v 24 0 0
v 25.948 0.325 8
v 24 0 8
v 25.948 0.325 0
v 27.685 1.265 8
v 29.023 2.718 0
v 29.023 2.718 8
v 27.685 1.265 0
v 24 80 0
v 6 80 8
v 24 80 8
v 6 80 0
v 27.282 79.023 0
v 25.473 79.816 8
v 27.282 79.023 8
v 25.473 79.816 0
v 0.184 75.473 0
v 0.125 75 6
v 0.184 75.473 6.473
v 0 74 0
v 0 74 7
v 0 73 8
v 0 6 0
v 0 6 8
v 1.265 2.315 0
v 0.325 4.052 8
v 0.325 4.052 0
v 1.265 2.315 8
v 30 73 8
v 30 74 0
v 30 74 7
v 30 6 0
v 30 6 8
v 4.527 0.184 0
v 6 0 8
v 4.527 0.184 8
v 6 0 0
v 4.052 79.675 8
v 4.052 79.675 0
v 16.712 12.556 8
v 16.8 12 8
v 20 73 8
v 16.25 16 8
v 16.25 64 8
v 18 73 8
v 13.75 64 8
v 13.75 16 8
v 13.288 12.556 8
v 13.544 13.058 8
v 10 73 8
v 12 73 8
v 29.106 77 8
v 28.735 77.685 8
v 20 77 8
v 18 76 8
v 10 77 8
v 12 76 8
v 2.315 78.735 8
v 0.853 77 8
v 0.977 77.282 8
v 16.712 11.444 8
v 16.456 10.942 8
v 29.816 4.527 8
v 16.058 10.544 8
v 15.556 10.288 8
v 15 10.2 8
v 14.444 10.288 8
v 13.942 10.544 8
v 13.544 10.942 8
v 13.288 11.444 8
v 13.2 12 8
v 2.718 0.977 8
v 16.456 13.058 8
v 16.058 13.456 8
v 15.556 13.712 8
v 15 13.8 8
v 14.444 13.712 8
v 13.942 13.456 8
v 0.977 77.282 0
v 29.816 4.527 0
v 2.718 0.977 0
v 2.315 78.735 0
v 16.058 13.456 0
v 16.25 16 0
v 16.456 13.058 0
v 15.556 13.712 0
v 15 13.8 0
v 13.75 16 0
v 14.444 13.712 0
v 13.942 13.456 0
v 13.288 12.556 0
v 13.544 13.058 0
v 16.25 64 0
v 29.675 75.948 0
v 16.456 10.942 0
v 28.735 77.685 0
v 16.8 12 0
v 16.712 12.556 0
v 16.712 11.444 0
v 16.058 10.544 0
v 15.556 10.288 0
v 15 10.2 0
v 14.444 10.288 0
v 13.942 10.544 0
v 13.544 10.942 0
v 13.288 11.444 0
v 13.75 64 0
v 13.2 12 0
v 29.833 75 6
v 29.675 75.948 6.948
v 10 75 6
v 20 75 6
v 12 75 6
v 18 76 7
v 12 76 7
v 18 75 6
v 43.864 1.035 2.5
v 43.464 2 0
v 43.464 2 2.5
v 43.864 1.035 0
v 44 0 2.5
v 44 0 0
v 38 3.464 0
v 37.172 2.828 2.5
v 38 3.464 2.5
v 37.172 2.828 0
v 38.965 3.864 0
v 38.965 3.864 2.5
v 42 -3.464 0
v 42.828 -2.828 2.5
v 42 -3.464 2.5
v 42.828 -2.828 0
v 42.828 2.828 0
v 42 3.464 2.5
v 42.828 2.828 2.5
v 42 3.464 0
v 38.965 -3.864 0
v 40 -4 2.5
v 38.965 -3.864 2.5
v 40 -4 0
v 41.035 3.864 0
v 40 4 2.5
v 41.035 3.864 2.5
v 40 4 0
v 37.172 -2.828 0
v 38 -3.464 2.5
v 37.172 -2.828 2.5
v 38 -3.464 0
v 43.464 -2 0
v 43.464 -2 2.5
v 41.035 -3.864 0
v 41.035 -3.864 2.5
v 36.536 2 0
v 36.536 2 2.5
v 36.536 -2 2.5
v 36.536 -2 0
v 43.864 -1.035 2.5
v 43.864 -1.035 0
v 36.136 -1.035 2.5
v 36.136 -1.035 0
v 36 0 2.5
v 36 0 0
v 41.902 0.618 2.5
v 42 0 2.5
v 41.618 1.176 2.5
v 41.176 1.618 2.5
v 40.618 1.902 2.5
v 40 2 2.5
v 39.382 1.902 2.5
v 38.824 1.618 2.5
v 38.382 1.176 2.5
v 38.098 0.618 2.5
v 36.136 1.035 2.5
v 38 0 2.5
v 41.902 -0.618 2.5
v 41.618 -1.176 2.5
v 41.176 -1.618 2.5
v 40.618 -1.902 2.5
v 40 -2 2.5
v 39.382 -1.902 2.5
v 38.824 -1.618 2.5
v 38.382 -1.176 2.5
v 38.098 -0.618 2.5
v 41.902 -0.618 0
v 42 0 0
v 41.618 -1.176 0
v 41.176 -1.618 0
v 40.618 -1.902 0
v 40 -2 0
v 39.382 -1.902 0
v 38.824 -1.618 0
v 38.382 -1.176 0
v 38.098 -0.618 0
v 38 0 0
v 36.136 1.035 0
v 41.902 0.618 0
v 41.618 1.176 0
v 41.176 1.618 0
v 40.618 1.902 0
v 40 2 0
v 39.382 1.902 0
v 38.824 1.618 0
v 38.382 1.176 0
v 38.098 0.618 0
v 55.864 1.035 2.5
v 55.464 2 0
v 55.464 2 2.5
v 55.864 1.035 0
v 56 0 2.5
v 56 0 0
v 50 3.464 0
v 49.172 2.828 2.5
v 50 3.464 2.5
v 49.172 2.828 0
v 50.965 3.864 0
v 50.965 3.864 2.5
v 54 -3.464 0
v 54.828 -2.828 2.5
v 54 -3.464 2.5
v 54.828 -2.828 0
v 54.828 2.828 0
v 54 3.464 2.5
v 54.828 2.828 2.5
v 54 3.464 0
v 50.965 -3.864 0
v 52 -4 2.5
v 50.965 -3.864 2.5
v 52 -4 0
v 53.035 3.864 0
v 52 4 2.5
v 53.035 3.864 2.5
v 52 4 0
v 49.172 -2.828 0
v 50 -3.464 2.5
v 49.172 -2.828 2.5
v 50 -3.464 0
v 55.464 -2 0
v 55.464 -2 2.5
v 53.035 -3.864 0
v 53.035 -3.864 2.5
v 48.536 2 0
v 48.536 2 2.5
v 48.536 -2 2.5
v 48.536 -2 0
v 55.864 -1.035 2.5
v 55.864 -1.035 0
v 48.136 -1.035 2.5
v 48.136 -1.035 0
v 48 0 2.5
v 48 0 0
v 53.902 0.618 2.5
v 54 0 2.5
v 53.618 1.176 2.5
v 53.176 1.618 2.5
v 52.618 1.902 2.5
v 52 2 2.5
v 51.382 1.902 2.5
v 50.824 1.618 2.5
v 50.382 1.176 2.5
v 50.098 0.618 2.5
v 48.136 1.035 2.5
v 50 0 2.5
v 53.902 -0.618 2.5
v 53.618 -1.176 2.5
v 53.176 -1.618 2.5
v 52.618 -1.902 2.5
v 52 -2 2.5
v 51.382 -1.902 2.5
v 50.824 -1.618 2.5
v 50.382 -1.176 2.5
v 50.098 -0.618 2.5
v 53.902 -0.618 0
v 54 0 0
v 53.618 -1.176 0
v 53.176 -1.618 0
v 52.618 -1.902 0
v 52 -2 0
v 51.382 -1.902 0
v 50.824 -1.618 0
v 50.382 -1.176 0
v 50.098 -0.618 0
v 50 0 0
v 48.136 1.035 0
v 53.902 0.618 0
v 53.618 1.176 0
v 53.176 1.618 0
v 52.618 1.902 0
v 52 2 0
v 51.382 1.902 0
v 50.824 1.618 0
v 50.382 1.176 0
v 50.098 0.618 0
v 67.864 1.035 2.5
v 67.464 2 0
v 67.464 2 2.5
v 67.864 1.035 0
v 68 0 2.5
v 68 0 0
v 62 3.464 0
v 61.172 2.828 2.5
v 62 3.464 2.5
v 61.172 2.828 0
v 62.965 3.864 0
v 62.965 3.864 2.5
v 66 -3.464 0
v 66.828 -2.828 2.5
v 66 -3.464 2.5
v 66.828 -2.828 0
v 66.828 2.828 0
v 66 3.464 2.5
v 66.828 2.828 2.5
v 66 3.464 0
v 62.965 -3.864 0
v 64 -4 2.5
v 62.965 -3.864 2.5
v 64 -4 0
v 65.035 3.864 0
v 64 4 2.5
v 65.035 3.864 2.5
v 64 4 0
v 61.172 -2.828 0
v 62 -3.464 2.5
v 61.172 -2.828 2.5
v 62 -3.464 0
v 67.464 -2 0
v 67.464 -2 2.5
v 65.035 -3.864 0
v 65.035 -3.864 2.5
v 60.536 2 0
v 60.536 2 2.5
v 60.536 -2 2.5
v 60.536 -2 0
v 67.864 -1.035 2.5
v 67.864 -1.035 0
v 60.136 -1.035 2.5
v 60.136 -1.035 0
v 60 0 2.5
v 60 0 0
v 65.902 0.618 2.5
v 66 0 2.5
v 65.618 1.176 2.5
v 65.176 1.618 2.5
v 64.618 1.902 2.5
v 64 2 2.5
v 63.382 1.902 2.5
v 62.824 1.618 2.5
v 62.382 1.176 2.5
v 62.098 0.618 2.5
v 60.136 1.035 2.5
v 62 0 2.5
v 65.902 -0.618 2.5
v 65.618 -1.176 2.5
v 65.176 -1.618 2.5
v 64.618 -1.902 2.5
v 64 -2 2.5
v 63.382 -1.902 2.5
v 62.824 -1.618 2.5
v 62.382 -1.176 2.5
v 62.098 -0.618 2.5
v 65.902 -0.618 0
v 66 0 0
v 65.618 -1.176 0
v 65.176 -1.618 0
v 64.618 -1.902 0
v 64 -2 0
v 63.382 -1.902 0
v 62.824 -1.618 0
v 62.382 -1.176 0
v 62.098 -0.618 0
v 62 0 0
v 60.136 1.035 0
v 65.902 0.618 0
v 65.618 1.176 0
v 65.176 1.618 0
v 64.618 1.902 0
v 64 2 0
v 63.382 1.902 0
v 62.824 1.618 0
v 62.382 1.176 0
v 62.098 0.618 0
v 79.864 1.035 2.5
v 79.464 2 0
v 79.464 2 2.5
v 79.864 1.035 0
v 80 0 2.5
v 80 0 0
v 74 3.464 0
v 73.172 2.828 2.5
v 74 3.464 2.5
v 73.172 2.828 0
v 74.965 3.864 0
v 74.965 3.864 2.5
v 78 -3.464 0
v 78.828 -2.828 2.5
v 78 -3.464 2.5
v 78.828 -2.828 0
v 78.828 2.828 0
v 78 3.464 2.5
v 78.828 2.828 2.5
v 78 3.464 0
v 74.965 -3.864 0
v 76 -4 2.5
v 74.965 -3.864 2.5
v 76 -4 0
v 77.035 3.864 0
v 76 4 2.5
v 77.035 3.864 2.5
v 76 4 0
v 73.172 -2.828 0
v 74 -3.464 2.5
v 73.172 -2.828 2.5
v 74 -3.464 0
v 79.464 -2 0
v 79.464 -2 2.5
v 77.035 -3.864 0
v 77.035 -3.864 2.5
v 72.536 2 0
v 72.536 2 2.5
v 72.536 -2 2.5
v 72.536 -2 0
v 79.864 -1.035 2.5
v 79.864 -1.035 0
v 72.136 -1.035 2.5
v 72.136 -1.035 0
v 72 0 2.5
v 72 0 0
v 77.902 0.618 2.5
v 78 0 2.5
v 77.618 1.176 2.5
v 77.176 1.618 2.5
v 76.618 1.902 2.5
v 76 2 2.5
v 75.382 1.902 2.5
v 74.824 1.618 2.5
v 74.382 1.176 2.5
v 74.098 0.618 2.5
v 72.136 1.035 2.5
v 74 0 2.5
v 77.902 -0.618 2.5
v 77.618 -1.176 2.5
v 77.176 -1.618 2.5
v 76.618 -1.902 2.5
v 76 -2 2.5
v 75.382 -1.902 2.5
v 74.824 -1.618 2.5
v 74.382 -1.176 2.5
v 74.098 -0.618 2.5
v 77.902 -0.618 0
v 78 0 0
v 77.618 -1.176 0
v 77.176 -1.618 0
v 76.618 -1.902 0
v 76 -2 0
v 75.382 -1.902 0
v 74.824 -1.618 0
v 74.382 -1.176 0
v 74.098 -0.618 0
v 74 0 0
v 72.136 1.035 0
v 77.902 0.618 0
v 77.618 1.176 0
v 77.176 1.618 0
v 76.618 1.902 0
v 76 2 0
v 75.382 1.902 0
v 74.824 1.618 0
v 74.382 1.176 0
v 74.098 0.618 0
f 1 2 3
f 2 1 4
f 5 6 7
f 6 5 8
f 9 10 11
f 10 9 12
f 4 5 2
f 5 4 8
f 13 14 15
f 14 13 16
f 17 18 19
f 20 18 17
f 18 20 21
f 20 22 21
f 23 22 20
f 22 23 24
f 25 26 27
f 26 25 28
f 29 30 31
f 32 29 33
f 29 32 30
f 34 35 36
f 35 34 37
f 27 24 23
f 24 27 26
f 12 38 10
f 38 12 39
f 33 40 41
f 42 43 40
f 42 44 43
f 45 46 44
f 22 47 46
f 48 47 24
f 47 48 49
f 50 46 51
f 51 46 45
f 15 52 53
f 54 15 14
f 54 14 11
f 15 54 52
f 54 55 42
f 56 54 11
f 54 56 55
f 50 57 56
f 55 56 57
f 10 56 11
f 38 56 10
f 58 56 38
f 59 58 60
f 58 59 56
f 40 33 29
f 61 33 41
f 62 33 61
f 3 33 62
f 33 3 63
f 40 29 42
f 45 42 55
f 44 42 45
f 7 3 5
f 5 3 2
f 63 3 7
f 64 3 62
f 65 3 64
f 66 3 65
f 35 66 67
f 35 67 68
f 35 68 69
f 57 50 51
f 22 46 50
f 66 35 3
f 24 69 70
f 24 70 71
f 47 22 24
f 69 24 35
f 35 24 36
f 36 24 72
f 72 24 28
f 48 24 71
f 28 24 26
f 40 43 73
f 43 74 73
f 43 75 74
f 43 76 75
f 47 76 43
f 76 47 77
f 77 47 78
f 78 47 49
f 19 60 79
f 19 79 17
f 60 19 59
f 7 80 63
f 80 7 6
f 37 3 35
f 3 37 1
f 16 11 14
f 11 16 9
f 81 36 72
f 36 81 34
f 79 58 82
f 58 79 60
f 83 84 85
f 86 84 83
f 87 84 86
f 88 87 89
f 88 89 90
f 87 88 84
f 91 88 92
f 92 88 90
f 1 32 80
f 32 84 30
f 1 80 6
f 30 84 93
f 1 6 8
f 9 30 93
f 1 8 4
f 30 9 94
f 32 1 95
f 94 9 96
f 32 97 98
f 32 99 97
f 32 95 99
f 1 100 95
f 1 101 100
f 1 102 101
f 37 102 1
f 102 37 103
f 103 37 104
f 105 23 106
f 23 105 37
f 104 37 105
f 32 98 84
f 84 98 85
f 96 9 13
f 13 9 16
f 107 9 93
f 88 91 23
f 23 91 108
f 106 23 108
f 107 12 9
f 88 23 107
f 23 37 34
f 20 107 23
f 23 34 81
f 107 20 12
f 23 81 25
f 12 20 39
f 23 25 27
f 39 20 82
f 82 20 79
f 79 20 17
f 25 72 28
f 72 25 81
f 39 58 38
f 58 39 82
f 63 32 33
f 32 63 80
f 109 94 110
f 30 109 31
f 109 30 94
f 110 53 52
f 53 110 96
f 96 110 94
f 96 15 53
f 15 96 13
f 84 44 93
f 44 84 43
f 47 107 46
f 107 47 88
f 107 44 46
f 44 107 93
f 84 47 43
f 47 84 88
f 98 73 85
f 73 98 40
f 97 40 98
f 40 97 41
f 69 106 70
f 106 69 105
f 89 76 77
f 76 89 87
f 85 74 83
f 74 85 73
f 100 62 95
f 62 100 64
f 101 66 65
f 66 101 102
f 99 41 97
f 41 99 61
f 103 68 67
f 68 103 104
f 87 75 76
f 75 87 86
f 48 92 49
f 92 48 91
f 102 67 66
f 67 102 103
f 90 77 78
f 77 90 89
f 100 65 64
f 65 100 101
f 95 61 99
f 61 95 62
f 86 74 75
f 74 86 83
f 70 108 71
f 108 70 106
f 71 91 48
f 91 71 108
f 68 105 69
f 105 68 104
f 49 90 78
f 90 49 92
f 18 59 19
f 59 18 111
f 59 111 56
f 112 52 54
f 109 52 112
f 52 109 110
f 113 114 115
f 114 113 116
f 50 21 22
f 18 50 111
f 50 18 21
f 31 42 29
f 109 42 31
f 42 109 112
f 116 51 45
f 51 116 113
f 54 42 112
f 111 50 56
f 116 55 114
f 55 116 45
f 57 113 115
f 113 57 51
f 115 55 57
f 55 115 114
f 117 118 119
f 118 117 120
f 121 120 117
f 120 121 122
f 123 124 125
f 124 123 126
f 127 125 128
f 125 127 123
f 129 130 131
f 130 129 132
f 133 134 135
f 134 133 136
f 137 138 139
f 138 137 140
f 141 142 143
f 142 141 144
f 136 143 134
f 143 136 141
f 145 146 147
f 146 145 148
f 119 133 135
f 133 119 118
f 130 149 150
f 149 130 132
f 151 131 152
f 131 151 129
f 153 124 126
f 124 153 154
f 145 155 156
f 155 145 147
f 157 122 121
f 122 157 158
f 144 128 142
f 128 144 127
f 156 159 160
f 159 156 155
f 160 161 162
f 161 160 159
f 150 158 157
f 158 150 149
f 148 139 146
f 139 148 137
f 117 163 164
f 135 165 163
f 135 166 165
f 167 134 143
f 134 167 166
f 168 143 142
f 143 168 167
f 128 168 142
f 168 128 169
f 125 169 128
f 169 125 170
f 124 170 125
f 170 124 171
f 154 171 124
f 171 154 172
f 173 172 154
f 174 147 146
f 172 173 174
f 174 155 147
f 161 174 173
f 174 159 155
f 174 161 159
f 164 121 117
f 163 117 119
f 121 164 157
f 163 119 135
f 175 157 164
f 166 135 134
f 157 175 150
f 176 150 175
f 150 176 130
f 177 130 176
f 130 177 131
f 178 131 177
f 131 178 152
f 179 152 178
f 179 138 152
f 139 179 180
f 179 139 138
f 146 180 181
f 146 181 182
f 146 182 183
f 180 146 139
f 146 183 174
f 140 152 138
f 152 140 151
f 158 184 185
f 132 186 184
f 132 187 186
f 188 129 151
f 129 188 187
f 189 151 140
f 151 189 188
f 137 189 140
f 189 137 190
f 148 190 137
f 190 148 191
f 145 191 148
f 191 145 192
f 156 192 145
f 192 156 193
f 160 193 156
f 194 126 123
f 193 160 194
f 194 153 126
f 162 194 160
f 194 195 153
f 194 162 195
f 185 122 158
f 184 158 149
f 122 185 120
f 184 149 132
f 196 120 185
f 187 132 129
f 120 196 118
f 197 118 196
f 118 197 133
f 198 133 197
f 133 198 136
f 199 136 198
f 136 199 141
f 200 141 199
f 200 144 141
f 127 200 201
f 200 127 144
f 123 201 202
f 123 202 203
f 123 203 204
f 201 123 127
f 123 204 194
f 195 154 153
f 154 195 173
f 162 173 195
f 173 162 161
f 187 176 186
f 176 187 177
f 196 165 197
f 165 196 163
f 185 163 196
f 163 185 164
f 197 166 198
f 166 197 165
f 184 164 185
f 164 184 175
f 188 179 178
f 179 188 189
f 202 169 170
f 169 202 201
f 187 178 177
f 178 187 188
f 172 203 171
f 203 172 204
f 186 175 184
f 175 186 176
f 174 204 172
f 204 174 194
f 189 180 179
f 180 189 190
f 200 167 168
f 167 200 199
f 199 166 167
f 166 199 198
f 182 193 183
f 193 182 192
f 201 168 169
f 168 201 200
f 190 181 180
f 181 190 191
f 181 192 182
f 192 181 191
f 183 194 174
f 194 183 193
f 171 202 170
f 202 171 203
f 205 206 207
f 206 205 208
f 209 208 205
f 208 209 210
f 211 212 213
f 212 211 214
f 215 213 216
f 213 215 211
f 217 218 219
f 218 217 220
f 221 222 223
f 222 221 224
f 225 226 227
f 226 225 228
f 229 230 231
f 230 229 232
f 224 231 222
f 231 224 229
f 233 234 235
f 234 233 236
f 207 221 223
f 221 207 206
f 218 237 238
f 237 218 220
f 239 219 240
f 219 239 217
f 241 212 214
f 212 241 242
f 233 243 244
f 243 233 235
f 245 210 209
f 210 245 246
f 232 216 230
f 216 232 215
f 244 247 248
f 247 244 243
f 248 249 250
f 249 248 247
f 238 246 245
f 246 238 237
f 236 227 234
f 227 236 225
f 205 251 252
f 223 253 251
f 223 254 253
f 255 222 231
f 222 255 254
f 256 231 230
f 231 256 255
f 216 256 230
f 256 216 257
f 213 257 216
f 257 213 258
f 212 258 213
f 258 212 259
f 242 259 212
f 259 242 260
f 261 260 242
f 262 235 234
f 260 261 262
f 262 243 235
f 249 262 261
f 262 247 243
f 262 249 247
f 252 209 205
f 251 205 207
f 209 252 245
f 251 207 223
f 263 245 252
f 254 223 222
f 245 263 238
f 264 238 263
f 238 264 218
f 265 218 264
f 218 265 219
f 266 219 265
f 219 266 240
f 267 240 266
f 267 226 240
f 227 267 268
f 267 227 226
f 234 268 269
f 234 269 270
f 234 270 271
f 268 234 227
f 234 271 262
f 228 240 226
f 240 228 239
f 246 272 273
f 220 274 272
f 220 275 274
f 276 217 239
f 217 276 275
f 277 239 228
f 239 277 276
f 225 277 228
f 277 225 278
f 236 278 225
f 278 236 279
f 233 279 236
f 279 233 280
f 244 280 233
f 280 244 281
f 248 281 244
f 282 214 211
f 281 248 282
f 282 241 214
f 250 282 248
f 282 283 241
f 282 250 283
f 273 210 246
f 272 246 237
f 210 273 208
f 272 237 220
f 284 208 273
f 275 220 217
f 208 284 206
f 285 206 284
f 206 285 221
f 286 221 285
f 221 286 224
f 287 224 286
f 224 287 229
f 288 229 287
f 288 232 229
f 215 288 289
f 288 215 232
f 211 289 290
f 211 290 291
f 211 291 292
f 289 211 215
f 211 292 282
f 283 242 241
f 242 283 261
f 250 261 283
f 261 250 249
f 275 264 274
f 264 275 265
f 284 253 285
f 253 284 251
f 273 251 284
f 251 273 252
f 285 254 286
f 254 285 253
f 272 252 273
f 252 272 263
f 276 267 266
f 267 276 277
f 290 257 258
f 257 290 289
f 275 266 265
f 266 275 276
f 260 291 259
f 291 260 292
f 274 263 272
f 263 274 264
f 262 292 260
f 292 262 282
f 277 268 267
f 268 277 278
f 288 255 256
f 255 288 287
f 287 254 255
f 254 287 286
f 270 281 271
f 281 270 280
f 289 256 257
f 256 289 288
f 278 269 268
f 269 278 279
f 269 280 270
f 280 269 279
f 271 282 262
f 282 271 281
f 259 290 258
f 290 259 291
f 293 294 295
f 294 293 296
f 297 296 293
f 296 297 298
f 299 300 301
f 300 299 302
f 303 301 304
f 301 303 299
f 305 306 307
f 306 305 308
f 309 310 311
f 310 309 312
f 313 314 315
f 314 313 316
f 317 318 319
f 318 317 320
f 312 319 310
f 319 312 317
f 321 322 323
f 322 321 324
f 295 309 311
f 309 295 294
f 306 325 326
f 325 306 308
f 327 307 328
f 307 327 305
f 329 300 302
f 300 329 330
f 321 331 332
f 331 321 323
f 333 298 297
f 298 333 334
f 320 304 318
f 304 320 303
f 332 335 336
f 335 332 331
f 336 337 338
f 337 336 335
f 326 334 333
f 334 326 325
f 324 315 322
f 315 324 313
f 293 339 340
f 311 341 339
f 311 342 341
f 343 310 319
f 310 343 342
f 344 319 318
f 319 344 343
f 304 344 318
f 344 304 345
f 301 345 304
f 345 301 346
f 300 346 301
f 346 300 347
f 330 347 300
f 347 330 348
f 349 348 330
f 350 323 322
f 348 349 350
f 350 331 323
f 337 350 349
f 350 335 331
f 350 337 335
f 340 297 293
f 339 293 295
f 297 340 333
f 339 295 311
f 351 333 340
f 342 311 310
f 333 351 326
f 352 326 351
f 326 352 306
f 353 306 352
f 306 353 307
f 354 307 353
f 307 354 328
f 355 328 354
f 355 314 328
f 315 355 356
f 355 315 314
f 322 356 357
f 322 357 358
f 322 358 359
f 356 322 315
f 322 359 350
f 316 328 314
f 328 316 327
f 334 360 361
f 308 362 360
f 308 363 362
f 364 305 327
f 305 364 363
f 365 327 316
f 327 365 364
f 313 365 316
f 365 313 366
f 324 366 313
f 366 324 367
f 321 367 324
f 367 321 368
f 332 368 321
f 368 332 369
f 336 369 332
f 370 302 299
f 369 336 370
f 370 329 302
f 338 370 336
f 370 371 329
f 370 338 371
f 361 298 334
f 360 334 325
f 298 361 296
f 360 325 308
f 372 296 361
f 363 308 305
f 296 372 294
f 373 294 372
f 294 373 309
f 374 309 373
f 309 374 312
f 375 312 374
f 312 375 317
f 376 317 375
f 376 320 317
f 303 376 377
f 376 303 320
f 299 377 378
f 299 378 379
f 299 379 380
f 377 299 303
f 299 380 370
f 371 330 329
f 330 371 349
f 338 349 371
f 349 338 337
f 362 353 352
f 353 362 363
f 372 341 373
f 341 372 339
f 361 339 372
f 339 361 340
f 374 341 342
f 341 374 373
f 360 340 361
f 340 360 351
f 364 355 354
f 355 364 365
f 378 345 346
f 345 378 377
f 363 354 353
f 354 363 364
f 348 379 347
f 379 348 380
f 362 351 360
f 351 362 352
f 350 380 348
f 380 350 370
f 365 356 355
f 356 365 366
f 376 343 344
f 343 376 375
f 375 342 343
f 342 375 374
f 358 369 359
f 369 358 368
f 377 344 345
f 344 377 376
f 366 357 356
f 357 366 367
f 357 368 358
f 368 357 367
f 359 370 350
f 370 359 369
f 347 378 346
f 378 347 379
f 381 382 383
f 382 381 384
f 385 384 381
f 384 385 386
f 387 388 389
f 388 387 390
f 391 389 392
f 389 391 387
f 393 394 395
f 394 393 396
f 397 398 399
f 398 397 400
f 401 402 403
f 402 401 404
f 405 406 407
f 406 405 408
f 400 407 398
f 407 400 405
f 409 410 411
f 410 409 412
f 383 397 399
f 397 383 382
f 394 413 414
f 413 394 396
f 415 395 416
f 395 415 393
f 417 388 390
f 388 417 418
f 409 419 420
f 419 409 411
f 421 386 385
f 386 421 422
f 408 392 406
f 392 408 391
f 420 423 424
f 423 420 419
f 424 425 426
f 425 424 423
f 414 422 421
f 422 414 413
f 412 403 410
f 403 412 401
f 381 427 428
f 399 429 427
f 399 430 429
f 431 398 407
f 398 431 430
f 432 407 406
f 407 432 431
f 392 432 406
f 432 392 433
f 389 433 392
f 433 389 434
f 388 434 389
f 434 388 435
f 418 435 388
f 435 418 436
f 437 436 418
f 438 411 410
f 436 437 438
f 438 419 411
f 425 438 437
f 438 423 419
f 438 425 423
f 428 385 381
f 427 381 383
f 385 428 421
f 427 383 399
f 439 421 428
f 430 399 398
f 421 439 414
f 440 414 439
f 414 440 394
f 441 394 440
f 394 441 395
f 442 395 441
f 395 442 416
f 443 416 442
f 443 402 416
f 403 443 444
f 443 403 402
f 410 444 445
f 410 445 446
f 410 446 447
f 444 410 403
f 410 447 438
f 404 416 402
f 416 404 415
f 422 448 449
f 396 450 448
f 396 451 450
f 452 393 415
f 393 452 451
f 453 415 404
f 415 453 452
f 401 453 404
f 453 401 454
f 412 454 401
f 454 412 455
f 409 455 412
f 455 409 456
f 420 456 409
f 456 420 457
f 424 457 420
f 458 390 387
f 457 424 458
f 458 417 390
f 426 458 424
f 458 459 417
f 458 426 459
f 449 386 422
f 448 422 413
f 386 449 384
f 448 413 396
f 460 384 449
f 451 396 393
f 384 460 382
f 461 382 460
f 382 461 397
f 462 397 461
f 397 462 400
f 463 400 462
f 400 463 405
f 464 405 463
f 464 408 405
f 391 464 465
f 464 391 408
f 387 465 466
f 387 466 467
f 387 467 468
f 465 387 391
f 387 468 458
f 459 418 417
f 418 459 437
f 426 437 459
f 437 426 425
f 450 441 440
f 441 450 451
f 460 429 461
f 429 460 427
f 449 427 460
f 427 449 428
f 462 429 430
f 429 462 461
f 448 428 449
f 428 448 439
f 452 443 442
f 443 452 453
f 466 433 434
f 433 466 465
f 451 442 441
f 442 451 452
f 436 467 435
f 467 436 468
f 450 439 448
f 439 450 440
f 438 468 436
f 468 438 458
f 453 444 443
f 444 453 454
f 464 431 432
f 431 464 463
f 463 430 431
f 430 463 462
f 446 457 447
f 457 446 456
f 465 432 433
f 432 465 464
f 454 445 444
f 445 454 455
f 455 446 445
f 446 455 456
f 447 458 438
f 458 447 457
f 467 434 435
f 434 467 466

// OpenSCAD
// Key Organizer - Quiet Carry Style
// PETG (durable, flexible tabs) — 0.2mm, 4 walls, 30% infill
// Holds 2-8 keys, M3 bolt pivot (hardware: 1x M3x20 + nut)

KEYS       = 5;    // Number of keys
BODY_W     = 30;
BODY_H     = 80;
BODY_T     = 8.0;
KEY_SLOT_W = 2.5;  // Key blade thickness + play
KEY_SLOT_H = 48;
PIVOT_D    = 3.6;  // M3 bolt + play
PIVOT_Z    = 12;
CORNER_R   = 6;
WALL_T     = 2.5;
SPRING_T   = 1.2;  // Friction spring tab thickness — PLA works, PETG better

module body_2d() {
    offset(r = CORNER_R)
        offset(r = -CORNER_R)
            square([BODY_W, BODY_H]);
}

module key_slot() {
    translate([BODY_W/2 - KEY_SLOT_W/2, PIVOT_Z + 4, -1])
        cube([KEY_SLOT_W, KEY_SLOT_H, BODY_T + 2]);
}

module pivot_hole() {
    translate([BODY_W/2, PIVOT_Z, -1])
        cylinder(d = PIVOT_D, h = BODY_T + 2, $fn = 20);
}

module friction_spring() {
    // Thin tab that presses against key stack for friction
    translate([BODY_W/2 - SPRING_T/2, PIVOT_Z + 1, BODY_T/2 - SPRING_T/2])
        rotate([0, 90, 0])
            cylinder(d = SPRING_T, h = BODY_W/2, $fn = 8);
}

module spacer() {
    // Spacer between keys — print 1 per key
    difference() {
        cylinder(d = 8, h = KEY_SLOT_W, $fn = 24);
        cylinder(d = PIVOT_D + 0.4, h = KEY_SLOT_W + 1, $fn = 20);
    }
}

// Main body
difference() {
    linear_extrude(BODY_T) body_2d();
    key_slot();
    pivot_hole();
    // Chamfer top corners for hand feel
    translate([0, BODY_H - 5, BODY_T - 2]) rotate([45, 0, 0])
        cube([BODY_W, 8, 8]);
}

// Carabiner hook slot
translate([BODY_W/2 - 5, BODY_H - 16, 0])
    difference() {
        cube([10, 14, BODY_T]);
        translate([2, 2, -1]) cube([6, 10, BODY_T + 2]);
    }

// Spacers (print 1 per key gap)
for (i = [0 : KEYS - 2])
    translate([BODY_W + 10 + i * 12, 0, 0])
        spacer();
